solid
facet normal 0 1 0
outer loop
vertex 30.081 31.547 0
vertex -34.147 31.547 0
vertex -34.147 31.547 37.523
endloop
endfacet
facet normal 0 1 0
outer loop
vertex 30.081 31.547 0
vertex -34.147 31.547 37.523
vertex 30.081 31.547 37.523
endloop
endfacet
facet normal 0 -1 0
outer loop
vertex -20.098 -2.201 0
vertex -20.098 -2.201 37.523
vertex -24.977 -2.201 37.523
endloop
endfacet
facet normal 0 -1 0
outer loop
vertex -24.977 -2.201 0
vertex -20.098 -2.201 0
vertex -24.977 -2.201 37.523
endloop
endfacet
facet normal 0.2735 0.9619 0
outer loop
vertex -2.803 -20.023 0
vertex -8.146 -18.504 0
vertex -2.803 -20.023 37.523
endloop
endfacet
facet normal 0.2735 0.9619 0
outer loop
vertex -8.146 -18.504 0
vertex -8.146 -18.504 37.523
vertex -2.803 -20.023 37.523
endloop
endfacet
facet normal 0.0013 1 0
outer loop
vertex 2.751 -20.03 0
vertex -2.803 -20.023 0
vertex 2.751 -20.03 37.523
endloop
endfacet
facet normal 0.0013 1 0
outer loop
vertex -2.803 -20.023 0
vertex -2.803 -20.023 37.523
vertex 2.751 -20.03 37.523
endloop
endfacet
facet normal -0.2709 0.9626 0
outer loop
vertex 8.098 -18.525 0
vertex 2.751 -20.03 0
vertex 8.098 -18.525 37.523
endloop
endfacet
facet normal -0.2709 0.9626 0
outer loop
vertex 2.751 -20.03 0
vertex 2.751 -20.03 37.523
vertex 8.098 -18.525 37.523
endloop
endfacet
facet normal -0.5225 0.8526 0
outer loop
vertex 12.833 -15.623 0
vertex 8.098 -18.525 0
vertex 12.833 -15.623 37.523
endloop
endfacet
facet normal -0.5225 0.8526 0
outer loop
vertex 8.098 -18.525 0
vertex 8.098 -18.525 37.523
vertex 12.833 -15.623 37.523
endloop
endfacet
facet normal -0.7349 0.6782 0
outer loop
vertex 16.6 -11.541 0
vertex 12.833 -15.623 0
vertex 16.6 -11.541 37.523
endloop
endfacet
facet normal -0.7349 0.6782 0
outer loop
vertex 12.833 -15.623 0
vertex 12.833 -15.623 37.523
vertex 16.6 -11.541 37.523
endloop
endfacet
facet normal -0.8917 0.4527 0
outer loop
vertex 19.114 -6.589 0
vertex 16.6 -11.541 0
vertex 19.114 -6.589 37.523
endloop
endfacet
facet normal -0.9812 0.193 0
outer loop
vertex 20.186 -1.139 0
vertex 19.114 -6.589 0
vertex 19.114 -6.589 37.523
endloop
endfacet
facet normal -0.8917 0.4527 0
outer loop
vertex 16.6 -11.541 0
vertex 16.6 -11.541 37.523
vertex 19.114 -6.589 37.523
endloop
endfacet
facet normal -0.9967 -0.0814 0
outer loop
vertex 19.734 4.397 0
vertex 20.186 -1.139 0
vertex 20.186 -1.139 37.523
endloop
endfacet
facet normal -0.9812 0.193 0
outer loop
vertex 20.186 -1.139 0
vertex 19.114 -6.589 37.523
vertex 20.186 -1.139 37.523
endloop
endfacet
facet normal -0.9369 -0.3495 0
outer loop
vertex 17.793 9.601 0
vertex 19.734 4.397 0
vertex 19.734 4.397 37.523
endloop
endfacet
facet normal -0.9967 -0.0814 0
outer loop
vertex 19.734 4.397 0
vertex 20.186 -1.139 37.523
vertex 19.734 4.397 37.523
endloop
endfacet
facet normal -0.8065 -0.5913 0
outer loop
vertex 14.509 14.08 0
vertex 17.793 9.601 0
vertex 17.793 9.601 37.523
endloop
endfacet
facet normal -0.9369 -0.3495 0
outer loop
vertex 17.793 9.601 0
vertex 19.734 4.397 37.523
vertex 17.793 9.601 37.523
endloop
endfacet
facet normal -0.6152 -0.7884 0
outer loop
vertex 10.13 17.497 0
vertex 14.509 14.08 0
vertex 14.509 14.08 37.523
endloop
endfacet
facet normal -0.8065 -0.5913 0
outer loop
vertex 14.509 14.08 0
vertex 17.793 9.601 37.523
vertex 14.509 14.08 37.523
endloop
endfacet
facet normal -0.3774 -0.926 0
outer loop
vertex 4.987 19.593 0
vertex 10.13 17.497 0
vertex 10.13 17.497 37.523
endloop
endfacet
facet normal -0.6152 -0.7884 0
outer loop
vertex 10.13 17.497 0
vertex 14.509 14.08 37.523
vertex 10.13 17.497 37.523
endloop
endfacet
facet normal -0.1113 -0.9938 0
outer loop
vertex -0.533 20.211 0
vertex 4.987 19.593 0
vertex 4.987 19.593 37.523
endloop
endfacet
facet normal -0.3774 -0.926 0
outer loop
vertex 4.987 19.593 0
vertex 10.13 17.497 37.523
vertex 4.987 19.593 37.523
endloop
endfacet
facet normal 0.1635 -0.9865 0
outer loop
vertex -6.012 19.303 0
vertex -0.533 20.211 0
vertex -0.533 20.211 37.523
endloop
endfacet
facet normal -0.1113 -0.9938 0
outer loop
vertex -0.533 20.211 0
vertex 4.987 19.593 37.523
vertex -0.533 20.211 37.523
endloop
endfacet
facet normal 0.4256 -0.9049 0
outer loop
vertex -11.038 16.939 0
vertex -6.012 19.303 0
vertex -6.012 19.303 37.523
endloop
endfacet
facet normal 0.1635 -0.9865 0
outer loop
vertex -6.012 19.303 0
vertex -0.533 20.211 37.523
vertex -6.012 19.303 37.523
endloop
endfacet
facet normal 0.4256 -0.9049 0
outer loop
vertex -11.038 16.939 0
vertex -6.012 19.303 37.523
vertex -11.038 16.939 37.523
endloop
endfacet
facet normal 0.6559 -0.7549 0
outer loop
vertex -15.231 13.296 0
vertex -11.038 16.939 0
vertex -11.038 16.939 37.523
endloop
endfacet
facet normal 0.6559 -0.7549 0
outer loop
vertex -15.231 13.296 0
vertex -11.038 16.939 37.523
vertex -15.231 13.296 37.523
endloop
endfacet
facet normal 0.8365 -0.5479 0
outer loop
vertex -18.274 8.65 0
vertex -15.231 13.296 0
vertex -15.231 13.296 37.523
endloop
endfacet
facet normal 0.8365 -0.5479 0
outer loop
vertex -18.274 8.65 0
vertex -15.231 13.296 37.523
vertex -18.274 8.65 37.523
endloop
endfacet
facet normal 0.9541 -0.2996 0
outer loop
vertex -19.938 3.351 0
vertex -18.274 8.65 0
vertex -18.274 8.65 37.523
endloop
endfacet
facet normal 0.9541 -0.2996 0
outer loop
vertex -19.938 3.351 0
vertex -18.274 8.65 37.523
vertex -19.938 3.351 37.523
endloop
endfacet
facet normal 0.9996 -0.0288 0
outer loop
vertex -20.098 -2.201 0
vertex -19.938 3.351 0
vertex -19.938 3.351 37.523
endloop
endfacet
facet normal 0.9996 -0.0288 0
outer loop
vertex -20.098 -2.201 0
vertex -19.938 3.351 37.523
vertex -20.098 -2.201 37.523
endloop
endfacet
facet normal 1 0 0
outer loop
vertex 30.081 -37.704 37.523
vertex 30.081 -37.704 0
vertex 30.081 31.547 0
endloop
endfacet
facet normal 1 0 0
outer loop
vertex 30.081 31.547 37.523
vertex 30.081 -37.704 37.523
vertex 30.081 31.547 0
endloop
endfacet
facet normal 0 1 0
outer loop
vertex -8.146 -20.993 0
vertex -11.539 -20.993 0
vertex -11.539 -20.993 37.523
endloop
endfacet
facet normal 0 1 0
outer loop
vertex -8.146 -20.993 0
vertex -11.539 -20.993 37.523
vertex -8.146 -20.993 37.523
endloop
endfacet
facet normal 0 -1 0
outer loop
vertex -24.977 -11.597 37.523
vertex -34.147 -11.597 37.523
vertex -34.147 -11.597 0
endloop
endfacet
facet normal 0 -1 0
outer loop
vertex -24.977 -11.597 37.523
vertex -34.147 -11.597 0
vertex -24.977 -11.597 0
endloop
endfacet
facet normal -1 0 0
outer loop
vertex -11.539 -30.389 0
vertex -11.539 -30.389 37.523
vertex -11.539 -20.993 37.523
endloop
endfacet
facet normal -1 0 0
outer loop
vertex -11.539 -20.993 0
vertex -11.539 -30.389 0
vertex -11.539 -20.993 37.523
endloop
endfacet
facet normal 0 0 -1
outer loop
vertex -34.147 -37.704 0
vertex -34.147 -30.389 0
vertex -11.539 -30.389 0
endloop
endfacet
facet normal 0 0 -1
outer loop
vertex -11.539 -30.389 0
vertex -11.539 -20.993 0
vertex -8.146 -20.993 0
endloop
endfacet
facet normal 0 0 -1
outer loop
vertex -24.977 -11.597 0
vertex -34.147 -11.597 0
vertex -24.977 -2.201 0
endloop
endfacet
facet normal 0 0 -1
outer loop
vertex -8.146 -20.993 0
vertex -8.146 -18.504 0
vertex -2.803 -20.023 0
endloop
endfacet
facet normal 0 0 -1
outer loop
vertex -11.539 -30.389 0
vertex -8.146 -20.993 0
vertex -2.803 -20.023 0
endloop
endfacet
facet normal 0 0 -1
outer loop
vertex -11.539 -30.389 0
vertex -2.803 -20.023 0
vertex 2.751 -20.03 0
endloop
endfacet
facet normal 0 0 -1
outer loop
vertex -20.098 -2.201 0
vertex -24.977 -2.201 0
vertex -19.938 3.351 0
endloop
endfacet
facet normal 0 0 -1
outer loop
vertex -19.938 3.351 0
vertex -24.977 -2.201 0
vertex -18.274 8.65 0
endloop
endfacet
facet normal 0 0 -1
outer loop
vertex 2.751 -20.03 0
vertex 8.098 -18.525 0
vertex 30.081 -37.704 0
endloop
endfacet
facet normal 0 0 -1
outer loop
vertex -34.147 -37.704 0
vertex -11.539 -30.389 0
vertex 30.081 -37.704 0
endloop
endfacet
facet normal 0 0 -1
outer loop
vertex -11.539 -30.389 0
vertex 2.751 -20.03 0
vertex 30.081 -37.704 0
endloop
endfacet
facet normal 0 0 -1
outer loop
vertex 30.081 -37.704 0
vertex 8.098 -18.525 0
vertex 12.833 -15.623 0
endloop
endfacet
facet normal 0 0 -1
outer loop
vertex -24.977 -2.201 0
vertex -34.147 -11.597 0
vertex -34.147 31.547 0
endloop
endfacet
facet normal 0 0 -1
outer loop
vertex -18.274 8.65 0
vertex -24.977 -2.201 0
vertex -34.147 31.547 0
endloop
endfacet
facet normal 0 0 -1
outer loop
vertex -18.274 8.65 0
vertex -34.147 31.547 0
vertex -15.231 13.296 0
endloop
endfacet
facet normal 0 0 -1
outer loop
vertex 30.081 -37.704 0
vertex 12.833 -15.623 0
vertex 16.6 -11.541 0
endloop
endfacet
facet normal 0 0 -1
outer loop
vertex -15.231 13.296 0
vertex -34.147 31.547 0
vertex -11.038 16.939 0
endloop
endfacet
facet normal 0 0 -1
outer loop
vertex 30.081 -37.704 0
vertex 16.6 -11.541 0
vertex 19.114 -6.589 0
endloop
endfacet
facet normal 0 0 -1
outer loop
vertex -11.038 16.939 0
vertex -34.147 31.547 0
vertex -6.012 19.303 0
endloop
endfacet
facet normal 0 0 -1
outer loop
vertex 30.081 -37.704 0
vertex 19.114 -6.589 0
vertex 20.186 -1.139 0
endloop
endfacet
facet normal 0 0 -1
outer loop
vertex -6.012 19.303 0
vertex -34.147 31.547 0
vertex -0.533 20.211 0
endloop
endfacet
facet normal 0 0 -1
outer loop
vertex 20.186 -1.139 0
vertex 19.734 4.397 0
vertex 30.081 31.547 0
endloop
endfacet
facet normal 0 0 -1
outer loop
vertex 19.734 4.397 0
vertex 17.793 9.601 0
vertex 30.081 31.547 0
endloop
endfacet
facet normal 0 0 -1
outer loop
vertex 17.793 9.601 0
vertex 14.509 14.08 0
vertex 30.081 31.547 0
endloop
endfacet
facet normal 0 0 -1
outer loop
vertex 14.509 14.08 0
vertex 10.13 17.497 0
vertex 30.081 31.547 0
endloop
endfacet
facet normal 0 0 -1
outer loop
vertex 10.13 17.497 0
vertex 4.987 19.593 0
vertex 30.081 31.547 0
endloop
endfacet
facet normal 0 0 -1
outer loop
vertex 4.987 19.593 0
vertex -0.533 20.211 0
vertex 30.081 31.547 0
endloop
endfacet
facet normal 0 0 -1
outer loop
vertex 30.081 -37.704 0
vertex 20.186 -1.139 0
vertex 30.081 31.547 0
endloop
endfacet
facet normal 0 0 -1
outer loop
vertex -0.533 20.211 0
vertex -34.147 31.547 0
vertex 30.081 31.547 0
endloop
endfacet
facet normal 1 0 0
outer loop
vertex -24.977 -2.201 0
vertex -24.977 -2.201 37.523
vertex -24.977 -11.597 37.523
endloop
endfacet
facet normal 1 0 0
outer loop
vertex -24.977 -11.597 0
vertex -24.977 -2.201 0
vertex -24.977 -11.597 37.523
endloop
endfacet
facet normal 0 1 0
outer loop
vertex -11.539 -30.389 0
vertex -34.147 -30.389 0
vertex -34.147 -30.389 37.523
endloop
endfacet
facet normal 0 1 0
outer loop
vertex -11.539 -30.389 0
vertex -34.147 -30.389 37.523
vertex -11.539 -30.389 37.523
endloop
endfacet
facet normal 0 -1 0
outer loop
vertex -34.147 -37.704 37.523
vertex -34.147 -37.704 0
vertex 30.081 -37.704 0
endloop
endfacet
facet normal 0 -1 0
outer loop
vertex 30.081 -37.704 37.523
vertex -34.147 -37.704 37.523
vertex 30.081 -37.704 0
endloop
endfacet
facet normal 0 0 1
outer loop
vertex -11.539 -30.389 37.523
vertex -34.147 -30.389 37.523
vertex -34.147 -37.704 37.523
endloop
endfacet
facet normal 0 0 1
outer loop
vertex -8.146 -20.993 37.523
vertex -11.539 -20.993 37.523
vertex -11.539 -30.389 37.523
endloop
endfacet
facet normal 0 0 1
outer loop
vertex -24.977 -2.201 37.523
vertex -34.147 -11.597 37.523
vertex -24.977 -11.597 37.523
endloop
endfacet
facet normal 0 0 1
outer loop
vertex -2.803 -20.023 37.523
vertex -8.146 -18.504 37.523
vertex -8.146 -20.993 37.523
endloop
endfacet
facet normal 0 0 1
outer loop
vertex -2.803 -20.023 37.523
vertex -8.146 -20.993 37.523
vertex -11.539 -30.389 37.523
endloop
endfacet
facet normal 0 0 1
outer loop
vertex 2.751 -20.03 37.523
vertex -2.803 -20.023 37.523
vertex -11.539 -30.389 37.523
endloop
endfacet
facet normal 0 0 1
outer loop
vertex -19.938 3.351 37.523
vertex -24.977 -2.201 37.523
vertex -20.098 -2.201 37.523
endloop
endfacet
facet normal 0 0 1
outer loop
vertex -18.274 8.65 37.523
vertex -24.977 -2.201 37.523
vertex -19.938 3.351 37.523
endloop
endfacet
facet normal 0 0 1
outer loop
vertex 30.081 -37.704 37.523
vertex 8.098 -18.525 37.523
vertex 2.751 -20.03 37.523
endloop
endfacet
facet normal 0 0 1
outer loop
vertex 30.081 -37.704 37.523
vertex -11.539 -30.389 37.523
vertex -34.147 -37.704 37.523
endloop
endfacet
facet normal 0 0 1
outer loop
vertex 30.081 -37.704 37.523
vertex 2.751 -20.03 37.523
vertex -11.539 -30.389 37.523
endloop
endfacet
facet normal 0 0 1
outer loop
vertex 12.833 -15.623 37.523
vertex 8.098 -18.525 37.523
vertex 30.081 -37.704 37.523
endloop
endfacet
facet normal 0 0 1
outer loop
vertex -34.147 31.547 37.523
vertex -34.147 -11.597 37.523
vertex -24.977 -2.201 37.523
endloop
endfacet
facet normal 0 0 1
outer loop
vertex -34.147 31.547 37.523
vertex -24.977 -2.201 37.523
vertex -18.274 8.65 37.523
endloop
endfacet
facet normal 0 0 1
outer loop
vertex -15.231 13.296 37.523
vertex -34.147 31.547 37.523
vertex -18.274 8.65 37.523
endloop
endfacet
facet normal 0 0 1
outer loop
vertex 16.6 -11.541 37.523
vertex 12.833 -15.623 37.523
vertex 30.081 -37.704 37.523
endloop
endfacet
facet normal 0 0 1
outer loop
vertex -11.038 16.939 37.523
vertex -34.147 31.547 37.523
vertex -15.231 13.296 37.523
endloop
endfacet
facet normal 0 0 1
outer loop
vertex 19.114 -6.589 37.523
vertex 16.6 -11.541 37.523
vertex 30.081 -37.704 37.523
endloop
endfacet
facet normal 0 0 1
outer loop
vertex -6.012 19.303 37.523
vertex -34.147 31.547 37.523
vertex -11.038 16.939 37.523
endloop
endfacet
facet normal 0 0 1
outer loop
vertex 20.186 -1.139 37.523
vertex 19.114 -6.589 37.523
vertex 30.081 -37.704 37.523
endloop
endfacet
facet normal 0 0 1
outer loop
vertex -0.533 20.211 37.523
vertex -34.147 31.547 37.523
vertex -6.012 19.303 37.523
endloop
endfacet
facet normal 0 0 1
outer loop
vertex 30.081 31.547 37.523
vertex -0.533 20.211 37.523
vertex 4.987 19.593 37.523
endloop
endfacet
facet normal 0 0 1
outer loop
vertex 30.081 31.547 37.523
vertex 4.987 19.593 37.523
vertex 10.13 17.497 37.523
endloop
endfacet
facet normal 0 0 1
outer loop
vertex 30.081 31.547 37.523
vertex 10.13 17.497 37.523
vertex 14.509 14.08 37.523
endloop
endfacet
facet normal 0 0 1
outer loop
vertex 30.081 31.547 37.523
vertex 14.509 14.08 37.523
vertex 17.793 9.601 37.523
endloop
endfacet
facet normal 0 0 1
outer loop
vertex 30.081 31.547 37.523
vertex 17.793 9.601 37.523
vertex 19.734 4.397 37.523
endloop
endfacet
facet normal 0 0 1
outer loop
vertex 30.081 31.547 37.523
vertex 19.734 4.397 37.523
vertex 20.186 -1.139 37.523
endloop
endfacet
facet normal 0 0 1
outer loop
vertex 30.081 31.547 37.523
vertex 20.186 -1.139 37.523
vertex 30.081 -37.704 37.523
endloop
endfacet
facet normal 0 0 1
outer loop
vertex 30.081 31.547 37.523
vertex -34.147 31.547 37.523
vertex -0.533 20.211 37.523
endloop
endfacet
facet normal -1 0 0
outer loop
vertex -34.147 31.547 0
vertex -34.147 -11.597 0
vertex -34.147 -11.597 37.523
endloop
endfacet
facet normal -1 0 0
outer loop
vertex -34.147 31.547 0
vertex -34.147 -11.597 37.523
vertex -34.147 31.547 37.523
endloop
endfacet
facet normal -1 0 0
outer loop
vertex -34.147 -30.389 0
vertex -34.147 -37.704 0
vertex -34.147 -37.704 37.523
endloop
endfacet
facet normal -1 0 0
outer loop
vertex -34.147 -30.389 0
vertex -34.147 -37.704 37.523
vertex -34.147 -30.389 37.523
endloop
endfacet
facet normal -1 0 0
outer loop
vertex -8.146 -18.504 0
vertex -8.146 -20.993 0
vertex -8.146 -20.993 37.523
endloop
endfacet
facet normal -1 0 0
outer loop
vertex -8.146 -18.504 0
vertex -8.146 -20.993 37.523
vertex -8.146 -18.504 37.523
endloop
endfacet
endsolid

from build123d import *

# Parameters (mm, degrees)
F0_W     = 64.227912575
F0_H     = 69.2516341805
F1_DEPTH = 37.5227332115
F2_R     = 20.2179019698
F3_DEPTH = 93.5621410608
F4_W     = 13.437692076
F4_H     = 9.3960277736
F5_DEPTH = 134.1055929661


with BuildPart() as f1:
    # F0 (on Top) → F1 (new body)
    with BuildSketch(Plane.XY):
        with Locations((-2.0325984806, -3.0785240233)):
            Rectangle(F0_W, F0_H)
    extrude(amount=F1_DEPTH)

    # F2 (on face) → F3 (cut)
    with BuildSketch(Plane.XY.offset(37.5227332115)):
        Circle(F2_R)
    extrude(amount=-F3_DEPTH, mode=Mode.SUBTRACT)

    # F4 (on face) → F5 (cut)
    with BuildSketch(Plane.XY.offset(37.5227332115)):
        with Locations((-18.2582512498, -25.6907660514)):
            Rectangle(F4_W, F4_H)
        with Locations((-31.6959433258, -25.6907660514)):
            Rectangle(F4_W, F4_H)
        with Locations((-18.2582512498, -16.2947382778)):
            Rectangle(F4_W, F4_H)
        Polygon((-11.5394052118, -11.596724391), (-11.5394052118, -20.9927521646), (-8.1456769597, -20.9927521646), (-8.1456769597, -2.2006966174), (-24.9770972878, -2.2006966174), (-24.9770972878, -11.596724391), align=None)
        with Locations((-31.6959433258, -16.2947382778)):
            Rectangle(F4_W, F4_H)
    extrude(amount=-F5_DEPTH, mode=Mode.SUBTRACT)


solid = f1.part
